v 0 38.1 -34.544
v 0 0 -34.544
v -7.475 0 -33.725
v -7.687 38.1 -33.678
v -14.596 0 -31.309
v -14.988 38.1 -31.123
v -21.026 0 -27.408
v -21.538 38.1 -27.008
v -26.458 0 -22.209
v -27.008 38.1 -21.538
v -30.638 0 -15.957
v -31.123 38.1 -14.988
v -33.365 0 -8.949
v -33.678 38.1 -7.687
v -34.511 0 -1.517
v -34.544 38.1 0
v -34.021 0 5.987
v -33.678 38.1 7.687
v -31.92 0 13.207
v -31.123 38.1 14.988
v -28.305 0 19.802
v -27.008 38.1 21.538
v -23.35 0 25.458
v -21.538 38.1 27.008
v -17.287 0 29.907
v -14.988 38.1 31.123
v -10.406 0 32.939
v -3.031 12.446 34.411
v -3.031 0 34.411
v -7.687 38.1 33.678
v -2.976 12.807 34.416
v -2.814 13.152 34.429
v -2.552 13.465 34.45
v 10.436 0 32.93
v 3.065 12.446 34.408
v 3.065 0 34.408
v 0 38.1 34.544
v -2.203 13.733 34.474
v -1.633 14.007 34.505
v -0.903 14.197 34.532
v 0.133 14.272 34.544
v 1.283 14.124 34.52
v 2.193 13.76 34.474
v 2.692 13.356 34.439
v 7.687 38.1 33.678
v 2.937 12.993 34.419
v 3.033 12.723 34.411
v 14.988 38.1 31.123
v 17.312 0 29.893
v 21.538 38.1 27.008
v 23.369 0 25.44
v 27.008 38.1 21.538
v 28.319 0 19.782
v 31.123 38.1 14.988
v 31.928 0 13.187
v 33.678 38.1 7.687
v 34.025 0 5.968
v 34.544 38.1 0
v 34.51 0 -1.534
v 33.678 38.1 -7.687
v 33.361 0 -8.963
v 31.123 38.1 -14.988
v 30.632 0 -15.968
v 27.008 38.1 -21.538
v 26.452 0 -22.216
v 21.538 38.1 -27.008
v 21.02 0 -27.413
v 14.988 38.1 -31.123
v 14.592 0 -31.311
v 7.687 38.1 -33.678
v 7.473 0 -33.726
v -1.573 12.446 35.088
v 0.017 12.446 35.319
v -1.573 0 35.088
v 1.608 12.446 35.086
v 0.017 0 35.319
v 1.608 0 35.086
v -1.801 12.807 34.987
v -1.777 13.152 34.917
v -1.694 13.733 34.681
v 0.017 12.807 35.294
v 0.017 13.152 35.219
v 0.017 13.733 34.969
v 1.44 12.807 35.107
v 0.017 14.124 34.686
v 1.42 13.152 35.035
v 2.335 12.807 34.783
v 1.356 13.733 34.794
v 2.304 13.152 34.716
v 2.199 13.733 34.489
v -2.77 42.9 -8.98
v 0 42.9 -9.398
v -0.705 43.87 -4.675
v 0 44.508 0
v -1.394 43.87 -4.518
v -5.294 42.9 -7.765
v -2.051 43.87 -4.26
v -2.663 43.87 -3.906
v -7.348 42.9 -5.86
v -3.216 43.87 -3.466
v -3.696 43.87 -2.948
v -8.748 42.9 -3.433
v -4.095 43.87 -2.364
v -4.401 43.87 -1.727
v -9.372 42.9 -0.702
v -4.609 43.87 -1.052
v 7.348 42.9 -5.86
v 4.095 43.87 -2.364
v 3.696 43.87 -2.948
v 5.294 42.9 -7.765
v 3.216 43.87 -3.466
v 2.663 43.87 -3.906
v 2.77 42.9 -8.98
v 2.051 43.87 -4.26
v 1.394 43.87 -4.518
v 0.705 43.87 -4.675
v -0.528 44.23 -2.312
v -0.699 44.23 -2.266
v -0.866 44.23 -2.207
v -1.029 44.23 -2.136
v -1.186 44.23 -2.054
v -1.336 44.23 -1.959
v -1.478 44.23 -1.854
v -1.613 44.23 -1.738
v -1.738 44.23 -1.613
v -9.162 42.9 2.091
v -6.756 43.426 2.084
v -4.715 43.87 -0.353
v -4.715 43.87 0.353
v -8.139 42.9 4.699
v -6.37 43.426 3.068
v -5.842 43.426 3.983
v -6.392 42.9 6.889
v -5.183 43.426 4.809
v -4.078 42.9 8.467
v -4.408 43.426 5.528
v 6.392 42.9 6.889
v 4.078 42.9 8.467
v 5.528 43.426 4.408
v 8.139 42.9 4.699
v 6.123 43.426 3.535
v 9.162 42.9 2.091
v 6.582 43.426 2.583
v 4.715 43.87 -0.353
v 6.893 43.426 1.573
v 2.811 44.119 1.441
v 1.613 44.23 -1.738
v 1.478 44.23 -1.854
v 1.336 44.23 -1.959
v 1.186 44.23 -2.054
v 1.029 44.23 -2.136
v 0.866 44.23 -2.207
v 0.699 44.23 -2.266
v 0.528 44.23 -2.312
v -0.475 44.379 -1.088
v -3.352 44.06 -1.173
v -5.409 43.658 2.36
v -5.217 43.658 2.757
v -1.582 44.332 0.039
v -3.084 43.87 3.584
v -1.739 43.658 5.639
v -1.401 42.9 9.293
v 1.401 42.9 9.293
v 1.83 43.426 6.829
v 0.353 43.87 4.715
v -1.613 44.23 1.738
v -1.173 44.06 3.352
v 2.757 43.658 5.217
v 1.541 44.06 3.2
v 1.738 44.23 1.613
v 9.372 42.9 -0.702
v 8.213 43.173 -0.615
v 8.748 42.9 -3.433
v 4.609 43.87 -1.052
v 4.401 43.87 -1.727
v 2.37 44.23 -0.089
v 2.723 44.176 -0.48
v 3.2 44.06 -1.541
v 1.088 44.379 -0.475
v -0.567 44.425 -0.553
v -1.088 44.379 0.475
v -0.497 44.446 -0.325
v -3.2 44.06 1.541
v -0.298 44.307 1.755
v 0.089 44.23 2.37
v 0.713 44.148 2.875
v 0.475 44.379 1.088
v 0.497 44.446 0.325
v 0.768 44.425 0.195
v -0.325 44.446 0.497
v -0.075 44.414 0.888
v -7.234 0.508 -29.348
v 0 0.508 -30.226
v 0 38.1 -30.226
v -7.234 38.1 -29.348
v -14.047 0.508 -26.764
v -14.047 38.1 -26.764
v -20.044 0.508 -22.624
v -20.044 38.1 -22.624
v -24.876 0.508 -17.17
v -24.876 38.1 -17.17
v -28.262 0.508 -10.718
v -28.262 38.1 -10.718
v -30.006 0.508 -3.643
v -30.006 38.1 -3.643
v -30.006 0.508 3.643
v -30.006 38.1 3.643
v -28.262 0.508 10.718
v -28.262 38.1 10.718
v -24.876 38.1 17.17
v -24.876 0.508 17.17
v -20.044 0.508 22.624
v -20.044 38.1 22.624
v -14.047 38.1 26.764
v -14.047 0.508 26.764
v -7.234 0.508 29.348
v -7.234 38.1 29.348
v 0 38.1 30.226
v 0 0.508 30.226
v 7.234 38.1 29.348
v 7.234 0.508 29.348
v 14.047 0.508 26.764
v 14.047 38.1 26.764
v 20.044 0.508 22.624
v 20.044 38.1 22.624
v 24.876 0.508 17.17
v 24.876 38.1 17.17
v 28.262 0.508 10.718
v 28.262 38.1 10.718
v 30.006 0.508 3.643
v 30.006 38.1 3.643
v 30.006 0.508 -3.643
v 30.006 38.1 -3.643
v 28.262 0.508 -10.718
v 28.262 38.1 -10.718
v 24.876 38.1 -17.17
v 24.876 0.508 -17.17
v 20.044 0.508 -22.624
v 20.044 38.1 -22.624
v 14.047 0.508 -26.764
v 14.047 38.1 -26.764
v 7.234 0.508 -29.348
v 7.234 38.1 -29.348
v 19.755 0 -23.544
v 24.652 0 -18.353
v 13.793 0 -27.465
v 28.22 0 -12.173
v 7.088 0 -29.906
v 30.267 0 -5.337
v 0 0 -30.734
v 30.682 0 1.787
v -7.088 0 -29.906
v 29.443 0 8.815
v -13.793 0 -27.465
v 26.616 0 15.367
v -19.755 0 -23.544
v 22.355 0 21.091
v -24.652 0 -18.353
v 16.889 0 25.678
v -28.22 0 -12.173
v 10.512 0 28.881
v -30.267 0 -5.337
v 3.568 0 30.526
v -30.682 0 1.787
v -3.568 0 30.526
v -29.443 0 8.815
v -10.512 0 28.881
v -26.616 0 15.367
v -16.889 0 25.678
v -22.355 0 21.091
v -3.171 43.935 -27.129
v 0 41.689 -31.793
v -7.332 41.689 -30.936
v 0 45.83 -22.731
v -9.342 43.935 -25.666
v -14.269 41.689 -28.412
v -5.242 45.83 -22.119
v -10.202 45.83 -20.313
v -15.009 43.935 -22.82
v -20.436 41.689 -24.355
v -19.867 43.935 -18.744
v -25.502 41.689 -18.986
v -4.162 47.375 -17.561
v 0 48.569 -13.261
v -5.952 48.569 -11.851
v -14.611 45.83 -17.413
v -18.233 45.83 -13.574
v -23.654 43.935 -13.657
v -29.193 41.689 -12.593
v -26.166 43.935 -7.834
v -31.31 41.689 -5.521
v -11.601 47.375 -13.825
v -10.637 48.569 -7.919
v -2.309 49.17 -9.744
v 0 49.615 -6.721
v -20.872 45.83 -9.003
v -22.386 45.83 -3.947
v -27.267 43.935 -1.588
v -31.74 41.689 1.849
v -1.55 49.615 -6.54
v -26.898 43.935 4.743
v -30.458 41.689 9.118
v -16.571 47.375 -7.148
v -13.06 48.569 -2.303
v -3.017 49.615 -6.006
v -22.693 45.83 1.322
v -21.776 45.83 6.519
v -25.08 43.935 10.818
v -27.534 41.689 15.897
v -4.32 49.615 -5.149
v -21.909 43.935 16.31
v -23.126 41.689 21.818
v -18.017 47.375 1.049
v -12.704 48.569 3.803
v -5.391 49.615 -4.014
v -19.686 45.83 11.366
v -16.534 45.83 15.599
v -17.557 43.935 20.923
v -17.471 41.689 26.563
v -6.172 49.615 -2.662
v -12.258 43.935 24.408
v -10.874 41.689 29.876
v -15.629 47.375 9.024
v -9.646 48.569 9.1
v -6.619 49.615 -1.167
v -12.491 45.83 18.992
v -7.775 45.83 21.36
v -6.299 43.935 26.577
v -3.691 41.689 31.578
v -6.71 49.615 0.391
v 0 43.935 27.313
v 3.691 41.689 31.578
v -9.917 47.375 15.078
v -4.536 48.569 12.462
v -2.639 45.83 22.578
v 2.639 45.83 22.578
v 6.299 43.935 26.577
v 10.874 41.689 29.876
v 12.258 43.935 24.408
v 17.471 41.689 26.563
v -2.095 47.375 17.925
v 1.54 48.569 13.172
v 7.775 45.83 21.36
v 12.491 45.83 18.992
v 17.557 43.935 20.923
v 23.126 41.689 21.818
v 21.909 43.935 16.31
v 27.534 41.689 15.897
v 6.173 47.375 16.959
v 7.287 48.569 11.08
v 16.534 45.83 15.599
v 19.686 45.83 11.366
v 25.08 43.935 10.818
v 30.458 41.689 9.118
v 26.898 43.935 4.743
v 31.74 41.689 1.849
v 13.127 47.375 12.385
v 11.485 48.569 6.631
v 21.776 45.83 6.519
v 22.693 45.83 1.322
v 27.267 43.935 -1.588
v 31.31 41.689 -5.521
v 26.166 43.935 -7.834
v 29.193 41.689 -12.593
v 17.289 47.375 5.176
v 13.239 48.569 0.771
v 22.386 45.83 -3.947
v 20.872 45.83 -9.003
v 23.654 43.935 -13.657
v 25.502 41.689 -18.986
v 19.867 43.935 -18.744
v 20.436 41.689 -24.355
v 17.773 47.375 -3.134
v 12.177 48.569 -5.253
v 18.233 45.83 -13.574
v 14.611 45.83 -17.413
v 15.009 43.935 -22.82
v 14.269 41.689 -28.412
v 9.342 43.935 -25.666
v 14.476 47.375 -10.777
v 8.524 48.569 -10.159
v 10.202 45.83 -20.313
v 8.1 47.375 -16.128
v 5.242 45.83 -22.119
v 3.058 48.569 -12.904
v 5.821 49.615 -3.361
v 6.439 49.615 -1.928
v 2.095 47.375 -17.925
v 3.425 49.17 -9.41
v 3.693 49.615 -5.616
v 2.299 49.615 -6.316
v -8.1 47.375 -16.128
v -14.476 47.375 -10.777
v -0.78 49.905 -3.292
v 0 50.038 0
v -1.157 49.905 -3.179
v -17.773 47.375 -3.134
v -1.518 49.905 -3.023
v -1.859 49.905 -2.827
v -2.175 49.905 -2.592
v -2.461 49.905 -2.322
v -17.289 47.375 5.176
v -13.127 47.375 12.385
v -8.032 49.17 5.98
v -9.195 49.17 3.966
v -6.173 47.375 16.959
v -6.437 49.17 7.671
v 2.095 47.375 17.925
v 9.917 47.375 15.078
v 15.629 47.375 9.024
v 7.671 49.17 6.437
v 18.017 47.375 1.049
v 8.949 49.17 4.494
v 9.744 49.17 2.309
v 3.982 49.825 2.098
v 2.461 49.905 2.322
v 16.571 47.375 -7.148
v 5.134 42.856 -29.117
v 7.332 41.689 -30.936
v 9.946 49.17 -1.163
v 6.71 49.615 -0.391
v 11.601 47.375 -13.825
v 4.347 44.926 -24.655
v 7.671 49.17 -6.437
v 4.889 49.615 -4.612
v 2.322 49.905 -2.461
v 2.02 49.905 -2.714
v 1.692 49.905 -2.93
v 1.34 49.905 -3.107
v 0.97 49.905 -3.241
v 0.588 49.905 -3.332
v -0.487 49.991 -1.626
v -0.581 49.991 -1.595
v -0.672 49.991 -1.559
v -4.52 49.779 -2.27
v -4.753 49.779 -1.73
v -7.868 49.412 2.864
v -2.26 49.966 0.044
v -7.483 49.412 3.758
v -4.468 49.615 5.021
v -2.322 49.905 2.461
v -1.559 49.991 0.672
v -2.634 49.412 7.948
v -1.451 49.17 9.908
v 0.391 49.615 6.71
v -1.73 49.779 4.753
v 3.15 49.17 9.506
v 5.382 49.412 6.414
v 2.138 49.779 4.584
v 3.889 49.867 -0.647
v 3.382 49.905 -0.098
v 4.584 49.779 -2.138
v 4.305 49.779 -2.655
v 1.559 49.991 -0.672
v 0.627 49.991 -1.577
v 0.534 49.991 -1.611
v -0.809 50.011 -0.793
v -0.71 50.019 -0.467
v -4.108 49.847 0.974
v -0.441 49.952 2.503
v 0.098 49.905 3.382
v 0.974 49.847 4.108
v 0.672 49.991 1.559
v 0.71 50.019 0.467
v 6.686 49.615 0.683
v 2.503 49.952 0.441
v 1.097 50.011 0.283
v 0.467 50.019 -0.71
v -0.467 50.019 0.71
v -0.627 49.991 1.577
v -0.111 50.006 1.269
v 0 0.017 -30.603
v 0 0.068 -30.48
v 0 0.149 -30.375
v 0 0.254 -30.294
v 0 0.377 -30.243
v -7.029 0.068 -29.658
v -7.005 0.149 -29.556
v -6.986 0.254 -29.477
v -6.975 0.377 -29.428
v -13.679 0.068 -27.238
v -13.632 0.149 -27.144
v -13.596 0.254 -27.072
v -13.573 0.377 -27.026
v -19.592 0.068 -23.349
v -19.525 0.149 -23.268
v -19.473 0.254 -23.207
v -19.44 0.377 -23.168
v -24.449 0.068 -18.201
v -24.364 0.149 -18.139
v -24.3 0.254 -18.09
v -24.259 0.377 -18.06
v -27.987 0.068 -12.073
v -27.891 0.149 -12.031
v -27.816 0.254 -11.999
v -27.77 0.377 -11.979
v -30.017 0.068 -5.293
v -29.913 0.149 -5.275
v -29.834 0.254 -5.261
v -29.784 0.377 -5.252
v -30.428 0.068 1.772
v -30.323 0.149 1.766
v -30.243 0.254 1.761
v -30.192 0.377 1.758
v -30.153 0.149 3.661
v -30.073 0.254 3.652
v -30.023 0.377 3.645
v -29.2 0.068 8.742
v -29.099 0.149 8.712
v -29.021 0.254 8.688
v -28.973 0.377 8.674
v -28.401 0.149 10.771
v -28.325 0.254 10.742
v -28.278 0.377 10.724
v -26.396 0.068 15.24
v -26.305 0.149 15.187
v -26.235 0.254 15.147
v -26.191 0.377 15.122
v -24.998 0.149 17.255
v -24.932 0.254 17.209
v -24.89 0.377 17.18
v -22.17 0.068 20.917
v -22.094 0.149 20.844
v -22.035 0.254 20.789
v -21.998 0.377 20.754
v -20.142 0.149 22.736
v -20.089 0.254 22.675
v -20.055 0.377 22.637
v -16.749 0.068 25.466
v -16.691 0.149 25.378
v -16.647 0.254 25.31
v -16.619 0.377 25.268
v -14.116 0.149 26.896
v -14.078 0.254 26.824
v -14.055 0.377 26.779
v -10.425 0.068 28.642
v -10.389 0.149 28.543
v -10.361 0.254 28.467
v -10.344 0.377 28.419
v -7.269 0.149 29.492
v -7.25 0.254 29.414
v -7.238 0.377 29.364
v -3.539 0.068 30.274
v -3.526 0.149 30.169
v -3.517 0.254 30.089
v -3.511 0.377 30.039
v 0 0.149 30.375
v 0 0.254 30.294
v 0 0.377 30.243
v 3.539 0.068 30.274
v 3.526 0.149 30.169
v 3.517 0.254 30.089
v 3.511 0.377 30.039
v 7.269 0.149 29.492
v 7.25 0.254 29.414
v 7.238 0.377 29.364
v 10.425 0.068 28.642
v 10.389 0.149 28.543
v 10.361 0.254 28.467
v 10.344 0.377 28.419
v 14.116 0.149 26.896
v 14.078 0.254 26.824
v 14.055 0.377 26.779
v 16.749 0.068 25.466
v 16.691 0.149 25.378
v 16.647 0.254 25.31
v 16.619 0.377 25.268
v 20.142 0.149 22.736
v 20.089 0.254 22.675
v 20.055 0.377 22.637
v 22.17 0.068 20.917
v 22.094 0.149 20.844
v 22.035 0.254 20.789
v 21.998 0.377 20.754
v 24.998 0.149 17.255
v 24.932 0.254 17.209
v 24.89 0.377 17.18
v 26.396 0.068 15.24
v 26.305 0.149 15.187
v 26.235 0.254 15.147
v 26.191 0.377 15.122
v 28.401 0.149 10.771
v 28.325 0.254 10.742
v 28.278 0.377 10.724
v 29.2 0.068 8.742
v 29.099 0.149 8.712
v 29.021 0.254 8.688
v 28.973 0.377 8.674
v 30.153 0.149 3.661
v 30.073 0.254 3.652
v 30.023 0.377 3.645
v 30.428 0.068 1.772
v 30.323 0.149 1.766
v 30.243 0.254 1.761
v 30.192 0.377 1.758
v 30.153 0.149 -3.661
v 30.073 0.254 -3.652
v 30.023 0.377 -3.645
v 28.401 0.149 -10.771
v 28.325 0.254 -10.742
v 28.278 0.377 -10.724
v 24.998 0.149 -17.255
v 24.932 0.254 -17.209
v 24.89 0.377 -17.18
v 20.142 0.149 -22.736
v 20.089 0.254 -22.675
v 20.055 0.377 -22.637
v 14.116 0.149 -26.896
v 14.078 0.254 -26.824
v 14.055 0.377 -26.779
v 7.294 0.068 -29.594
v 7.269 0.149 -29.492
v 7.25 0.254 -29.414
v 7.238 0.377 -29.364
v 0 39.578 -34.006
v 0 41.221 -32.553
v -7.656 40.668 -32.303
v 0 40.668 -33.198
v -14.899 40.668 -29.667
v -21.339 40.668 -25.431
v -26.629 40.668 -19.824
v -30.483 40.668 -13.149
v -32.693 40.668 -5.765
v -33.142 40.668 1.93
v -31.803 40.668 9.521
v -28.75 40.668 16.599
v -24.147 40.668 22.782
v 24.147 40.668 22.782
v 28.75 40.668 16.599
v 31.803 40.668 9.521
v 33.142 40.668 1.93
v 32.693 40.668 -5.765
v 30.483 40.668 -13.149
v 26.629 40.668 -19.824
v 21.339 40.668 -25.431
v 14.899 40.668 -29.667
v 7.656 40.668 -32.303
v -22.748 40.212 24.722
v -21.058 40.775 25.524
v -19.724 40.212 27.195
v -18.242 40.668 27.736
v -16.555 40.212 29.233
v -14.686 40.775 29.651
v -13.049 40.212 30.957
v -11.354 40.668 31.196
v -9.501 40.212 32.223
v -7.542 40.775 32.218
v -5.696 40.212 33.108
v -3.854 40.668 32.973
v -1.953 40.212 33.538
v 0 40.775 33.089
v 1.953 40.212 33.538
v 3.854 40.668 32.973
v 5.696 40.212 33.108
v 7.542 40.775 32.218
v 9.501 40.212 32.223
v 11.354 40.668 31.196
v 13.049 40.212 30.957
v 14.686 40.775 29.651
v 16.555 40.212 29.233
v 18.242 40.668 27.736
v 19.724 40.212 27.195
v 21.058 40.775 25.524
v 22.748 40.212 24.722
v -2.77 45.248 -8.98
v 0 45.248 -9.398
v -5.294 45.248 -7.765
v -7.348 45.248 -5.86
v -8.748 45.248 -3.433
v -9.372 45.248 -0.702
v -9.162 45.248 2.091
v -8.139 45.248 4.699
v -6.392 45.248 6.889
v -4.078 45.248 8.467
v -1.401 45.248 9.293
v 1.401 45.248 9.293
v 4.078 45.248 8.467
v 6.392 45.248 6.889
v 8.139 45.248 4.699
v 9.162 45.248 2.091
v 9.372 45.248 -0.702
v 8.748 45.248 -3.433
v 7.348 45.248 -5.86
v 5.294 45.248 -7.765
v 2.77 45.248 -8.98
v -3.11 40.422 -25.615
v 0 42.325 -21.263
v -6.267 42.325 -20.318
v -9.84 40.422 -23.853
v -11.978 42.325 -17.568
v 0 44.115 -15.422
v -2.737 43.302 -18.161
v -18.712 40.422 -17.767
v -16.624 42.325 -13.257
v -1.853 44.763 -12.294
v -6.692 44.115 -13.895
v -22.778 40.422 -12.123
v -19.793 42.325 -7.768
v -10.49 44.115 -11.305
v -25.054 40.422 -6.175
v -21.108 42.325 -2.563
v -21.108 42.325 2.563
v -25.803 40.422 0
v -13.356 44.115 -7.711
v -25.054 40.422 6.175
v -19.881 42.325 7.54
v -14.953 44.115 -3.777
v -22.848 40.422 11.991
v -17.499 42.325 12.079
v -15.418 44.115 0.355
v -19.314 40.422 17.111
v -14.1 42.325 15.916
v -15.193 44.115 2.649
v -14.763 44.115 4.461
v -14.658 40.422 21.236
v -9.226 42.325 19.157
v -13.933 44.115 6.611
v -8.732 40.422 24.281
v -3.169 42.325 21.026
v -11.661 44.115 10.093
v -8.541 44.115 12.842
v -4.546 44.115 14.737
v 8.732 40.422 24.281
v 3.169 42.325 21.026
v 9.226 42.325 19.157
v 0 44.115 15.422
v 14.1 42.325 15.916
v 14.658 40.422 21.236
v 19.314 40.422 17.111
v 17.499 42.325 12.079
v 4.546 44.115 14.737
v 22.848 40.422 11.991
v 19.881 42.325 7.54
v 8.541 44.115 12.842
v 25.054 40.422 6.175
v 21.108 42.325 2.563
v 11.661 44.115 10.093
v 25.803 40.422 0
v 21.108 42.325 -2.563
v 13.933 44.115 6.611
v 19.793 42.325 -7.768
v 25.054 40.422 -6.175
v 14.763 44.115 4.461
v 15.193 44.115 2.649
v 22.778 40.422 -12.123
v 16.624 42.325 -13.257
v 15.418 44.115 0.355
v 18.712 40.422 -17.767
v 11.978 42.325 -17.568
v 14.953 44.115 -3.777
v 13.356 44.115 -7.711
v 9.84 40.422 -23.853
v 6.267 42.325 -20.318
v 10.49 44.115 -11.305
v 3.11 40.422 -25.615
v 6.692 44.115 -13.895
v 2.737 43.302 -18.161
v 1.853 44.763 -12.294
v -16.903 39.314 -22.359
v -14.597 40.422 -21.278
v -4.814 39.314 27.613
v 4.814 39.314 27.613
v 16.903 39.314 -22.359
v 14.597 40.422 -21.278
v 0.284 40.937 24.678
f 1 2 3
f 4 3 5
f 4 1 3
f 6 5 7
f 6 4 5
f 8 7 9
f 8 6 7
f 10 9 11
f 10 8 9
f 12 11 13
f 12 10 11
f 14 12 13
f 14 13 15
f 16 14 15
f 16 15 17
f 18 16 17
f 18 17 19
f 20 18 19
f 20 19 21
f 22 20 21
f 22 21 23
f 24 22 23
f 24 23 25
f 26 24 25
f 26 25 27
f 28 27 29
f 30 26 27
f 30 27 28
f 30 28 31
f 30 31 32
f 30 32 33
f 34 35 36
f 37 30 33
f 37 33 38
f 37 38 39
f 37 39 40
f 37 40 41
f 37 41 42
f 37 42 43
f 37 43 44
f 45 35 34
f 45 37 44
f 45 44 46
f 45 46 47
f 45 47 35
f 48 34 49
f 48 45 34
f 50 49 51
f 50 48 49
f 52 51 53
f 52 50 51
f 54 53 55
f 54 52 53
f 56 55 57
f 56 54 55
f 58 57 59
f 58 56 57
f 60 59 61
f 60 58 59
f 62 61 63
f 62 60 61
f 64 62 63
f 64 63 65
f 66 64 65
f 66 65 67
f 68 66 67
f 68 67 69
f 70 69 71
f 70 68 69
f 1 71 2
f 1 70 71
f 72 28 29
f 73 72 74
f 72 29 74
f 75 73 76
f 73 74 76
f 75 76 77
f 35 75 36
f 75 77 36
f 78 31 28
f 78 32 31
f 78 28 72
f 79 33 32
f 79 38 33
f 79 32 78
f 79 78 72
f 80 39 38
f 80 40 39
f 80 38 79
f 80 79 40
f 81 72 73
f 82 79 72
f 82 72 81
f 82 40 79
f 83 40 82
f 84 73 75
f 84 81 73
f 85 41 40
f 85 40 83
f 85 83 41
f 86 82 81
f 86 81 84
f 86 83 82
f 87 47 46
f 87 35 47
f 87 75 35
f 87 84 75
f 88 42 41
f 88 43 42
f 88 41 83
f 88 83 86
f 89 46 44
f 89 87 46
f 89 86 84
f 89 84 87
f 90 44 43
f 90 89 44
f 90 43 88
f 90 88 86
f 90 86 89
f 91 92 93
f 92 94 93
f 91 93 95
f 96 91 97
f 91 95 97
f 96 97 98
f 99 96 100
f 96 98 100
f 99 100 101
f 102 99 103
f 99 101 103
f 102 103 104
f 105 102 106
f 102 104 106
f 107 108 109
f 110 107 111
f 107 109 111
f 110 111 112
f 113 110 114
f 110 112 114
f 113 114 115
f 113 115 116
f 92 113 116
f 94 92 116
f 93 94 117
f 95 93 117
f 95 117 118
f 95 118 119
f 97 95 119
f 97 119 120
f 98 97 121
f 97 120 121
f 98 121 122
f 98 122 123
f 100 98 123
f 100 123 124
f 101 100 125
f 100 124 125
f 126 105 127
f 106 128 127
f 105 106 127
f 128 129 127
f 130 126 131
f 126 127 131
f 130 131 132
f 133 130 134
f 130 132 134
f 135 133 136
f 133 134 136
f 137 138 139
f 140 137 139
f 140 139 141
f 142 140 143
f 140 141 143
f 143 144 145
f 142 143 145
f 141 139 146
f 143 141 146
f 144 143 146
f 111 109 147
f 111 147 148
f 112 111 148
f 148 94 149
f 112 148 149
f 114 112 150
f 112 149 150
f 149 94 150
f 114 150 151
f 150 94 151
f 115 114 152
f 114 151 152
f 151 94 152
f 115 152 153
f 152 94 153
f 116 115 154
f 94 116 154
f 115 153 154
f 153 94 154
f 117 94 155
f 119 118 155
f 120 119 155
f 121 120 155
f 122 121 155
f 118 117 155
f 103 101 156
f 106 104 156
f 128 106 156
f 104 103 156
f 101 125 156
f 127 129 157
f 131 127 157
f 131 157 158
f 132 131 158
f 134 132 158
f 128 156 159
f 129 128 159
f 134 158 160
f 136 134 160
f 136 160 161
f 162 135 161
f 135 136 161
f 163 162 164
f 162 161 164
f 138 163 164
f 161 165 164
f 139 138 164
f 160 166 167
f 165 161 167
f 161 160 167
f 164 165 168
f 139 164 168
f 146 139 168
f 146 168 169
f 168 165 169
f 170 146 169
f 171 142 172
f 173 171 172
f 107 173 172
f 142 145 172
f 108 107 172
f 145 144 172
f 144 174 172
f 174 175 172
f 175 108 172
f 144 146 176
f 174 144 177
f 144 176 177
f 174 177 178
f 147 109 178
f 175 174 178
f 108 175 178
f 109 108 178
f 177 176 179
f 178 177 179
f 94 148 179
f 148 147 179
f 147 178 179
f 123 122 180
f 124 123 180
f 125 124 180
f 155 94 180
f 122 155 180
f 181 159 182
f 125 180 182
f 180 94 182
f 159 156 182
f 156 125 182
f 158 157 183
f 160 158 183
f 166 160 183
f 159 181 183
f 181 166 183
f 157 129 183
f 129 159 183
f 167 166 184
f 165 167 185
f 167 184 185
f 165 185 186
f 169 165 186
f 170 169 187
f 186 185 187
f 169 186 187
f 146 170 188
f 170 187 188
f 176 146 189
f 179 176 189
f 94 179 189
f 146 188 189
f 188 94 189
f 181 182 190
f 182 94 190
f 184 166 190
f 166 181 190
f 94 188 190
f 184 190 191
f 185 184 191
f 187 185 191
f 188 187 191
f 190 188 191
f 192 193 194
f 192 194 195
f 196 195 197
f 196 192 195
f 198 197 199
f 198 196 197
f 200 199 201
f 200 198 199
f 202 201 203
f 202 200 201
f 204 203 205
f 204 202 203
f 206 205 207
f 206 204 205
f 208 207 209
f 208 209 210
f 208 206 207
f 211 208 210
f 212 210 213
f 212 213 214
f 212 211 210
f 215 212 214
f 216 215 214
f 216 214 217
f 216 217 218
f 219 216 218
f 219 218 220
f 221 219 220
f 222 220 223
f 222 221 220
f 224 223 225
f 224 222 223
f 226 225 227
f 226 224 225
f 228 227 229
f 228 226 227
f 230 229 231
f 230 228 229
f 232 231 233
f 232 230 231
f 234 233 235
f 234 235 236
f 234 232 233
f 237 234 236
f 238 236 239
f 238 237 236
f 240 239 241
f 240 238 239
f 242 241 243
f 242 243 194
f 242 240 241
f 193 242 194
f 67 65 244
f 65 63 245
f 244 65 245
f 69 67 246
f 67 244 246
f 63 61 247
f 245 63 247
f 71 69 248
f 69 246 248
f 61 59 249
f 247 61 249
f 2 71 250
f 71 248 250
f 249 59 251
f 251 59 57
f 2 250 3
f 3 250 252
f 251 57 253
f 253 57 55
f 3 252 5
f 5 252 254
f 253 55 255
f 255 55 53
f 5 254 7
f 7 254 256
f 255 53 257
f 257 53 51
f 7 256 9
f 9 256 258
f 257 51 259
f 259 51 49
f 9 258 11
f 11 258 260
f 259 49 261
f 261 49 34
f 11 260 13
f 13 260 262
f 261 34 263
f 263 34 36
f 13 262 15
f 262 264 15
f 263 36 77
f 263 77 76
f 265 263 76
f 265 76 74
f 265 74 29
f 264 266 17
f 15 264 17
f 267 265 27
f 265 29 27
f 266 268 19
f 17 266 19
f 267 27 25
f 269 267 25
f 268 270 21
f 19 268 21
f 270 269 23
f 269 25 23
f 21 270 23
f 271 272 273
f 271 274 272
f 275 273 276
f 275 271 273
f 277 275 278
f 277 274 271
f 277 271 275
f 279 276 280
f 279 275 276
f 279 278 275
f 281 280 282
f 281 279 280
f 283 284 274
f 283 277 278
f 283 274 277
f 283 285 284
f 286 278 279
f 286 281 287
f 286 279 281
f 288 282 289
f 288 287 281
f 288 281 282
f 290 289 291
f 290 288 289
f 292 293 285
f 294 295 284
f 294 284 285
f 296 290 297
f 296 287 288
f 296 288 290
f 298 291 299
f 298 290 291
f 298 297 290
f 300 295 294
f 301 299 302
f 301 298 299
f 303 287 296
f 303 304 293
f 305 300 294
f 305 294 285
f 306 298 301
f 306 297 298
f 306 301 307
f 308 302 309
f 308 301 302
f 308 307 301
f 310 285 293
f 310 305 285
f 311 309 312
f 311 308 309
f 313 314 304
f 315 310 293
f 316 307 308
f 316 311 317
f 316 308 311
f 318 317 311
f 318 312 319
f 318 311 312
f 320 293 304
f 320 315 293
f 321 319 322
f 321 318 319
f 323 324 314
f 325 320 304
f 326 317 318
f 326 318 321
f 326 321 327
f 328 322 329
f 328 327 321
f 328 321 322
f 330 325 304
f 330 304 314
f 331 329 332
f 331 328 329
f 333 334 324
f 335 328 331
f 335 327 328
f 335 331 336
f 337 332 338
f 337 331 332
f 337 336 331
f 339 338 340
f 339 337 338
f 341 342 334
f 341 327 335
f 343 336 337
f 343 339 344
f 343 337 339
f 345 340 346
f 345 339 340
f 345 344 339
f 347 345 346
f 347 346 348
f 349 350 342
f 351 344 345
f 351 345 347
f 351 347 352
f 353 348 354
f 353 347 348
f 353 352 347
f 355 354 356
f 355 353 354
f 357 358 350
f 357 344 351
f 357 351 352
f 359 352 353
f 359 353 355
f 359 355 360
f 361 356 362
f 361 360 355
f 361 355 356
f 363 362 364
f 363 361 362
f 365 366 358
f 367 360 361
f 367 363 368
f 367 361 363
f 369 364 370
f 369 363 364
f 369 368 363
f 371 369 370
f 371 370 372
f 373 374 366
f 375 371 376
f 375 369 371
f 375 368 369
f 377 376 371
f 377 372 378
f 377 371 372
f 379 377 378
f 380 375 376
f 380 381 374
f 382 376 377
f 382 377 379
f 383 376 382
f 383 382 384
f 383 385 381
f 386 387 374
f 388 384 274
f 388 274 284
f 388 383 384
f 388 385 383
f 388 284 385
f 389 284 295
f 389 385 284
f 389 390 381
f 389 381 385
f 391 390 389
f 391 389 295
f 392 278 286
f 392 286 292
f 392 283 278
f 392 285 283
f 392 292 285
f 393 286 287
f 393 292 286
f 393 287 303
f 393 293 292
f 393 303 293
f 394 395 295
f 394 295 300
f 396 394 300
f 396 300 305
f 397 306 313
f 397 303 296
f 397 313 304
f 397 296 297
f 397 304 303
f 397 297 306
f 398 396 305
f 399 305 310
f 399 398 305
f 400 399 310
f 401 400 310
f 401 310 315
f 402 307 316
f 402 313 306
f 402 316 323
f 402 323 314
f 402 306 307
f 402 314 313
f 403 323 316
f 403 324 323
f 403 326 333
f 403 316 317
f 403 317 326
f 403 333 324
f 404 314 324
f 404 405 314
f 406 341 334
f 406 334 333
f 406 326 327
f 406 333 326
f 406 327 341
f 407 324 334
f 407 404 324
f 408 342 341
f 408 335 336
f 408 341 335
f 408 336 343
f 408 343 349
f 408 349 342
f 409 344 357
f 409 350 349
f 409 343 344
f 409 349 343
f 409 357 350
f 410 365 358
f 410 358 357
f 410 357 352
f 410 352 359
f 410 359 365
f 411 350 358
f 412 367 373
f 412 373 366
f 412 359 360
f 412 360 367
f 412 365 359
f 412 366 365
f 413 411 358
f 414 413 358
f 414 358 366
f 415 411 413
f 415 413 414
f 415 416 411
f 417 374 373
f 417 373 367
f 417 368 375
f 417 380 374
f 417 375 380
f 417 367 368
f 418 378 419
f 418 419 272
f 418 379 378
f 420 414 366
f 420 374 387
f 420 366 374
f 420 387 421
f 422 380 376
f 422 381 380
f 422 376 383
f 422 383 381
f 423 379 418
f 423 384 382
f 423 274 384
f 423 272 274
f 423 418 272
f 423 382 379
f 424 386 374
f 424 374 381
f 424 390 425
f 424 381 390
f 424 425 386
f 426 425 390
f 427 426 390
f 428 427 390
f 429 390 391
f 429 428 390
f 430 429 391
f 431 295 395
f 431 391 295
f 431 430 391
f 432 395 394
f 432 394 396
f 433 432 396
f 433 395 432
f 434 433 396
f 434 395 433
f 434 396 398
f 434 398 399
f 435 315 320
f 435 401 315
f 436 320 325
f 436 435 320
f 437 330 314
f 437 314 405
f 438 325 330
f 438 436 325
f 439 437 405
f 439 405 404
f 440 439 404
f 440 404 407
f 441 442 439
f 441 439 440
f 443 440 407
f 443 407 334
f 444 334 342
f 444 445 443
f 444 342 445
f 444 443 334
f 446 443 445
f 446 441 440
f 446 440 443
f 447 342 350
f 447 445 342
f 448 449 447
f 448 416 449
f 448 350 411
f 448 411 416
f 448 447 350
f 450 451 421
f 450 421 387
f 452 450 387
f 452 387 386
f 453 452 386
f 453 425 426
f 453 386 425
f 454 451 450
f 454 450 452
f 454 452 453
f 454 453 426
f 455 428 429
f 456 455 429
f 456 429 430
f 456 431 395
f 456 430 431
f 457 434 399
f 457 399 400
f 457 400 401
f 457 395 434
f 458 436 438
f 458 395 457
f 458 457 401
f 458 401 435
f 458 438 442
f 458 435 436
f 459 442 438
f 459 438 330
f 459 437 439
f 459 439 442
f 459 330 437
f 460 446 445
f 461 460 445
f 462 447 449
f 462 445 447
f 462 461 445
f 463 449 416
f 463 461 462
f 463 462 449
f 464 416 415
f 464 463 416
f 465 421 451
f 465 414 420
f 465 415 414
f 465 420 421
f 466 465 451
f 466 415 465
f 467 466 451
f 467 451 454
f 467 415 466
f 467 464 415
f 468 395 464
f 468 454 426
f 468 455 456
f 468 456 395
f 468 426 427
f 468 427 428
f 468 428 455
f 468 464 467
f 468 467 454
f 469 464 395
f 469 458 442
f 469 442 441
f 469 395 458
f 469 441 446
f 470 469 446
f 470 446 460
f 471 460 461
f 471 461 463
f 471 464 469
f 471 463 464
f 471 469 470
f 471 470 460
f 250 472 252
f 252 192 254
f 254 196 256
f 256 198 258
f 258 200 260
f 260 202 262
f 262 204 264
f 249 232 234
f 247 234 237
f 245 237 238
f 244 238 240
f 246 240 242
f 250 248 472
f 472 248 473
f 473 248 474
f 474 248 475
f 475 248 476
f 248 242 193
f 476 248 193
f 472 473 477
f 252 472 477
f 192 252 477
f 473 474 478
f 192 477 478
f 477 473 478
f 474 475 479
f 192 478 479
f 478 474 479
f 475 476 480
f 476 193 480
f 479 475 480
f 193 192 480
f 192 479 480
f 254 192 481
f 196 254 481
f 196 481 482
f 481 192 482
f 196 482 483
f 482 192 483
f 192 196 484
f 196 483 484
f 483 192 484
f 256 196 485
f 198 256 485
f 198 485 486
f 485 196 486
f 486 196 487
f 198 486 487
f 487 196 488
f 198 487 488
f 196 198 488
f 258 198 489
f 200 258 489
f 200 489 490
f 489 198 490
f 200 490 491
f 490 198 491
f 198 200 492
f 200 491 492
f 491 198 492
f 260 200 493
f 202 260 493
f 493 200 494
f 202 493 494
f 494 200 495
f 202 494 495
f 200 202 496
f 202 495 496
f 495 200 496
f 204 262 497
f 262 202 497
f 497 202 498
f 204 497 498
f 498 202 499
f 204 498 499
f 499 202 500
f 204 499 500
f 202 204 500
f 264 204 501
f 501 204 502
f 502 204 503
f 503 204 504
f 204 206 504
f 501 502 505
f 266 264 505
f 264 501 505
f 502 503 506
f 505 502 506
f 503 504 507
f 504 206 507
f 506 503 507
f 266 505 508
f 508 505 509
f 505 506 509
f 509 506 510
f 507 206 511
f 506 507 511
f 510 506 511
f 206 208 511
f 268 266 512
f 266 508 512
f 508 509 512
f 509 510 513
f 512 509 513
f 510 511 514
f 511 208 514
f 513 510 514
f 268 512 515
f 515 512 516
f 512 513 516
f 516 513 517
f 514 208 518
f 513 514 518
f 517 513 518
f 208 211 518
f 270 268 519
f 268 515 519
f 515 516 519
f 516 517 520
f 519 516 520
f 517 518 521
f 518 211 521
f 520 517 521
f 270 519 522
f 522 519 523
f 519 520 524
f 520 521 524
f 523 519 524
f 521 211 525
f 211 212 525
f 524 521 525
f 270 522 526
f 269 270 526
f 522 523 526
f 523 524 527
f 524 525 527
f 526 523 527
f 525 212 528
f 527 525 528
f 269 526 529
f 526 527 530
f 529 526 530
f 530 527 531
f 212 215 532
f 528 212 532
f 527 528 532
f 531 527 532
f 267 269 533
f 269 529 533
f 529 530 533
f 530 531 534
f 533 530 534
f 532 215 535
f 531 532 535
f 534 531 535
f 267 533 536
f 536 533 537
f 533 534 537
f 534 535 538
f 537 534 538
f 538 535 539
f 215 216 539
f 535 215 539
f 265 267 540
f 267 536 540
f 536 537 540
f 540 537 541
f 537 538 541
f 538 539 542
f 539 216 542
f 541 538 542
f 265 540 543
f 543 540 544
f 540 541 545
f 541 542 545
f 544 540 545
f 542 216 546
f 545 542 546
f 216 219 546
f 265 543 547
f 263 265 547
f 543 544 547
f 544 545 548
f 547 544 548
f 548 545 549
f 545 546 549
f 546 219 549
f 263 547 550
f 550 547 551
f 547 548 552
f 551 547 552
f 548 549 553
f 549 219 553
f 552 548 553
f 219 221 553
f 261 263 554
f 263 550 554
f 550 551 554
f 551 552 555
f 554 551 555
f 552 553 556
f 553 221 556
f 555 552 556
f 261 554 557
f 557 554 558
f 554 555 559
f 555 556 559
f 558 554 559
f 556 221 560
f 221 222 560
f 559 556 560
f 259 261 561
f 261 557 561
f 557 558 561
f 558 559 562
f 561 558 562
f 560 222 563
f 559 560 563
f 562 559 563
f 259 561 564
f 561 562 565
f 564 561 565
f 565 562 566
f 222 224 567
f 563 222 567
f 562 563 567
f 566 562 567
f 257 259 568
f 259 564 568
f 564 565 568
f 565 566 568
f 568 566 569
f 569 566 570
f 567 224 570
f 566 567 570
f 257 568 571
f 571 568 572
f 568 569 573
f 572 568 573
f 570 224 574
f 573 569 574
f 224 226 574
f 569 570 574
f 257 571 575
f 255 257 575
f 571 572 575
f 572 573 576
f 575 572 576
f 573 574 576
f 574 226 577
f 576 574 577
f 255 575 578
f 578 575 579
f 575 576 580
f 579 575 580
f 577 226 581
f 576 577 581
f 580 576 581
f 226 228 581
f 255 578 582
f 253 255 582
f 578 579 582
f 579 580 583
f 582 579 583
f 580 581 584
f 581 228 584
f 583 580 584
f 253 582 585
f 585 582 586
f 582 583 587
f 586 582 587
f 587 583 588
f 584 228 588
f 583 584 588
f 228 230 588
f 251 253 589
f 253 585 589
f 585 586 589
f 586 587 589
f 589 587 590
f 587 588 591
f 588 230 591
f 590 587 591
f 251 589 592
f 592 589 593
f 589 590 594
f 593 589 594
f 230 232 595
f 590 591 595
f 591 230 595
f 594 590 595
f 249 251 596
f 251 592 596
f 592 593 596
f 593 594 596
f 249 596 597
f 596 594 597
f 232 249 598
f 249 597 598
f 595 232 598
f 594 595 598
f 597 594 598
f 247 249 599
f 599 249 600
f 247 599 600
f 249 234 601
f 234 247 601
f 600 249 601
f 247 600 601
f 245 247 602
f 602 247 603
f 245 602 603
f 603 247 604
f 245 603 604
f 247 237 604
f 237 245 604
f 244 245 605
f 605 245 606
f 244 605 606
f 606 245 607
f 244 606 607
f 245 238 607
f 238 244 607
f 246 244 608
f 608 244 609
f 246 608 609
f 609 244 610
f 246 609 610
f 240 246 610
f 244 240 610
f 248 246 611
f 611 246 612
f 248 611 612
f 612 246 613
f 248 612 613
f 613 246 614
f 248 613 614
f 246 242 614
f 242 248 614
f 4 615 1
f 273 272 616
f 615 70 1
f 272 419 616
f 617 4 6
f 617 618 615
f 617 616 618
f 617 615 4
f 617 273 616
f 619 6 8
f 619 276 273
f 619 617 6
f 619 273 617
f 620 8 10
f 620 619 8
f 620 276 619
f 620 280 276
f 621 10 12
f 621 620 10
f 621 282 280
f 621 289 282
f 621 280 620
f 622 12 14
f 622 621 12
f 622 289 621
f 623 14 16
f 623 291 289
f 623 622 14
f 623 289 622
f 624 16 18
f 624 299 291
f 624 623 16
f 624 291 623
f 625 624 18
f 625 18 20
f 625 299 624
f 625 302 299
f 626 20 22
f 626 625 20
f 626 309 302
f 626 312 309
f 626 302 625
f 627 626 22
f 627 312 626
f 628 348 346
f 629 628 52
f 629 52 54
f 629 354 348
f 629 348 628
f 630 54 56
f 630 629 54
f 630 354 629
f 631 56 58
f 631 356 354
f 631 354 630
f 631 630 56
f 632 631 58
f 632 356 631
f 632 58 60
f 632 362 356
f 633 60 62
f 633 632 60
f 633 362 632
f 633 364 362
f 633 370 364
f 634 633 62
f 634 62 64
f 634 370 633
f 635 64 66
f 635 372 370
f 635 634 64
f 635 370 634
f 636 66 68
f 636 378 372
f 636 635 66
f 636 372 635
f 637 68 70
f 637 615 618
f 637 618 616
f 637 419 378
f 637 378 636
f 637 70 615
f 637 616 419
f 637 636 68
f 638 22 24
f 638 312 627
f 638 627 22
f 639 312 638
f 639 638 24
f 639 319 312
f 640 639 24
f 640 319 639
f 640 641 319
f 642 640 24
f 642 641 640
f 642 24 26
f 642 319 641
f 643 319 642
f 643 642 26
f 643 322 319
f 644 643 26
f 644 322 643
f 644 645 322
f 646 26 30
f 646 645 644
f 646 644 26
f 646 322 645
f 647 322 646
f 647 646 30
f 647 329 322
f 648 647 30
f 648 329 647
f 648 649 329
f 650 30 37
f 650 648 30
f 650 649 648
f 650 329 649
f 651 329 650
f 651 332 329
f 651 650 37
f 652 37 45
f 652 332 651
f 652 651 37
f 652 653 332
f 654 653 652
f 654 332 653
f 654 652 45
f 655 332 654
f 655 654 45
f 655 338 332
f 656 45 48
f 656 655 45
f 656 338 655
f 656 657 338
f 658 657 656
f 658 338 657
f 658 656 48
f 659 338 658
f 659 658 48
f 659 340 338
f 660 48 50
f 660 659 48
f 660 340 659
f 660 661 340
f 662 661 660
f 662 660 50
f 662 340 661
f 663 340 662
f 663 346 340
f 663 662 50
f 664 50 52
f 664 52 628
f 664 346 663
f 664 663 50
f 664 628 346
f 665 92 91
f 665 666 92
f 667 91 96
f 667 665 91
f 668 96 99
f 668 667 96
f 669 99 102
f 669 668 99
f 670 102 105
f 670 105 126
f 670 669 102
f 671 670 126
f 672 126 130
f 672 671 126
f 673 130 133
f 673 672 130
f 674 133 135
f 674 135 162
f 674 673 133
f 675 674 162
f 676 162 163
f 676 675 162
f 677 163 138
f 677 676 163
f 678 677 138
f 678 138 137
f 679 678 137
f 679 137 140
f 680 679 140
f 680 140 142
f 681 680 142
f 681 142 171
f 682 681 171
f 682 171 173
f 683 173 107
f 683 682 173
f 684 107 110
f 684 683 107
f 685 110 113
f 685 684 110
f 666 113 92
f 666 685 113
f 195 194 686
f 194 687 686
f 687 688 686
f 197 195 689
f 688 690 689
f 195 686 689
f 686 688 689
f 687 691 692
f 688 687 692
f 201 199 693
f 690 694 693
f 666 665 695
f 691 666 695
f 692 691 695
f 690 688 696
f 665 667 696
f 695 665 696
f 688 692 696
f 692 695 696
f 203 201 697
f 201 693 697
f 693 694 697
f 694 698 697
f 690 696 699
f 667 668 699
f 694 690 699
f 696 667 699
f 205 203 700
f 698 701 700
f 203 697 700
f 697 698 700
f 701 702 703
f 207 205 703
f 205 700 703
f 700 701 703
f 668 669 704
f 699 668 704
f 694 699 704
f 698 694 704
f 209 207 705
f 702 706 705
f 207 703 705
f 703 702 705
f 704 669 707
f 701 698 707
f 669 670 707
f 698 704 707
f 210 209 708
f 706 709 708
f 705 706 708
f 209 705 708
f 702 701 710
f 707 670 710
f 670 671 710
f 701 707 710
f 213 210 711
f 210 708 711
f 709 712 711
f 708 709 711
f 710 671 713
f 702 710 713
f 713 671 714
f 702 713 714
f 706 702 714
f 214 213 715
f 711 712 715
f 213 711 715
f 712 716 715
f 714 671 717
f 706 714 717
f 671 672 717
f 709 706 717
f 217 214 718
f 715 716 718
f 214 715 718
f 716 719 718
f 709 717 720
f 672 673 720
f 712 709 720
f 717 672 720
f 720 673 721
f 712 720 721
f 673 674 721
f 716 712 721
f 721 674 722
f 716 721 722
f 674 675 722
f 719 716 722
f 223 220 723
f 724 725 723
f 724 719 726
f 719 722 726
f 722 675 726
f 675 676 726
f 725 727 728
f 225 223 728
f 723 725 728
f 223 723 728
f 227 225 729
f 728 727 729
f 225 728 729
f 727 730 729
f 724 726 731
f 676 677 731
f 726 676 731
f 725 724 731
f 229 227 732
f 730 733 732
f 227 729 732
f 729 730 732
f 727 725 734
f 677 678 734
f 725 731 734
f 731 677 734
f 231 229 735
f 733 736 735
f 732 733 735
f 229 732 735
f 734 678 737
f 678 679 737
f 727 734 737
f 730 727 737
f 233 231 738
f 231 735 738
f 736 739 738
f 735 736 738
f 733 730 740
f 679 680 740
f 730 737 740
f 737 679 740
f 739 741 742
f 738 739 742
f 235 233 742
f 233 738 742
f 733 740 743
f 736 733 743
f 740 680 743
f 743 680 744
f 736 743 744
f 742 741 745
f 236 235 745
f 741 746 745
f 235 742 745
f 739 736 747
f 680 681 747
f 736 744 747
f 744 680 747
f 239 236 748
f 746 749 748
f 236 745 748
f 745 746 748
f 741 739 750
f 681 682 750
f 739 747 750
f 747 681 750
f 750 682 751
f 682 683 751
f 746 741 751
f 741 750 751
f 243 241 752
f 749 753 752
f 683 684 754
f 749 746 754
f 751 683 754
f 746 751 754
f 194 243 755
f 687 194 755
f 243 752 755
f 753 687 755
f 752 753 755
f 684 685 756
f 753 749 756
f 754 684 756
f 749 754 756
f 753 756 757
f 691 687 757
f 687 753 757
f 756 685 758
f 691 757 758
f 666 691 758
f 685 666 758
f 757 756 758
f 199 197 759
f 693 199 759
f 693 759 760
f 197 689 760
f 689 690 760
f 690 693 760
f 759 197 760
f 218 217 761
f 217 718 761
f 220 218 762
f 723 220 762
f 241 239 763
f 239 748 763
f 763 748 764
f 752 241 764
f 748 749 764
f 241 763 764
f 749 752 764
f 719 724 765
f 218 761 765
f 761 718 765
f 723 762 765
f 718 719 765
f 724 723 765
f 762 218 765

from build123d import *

# Parameters (mm, degrees)
BOSS_EXTRUDE1_DEPTH = 14.986
FILLET1_R           = 2.54
FILLET2_R           = 0.508


with BuildPart() as part:
    # Sketch1 → Revolve1 (revolve)
    with BuildSketch(Plane(origin=(0, 0, 0), x_dir=(0, 0, -1), z_dir=(1, 0, 0)), mode=Mode.PRIVATE) as revolve1_sk:
        with BuildLine():
            Line((-30.226, 0), (-34.544, 0))
            Line((-34.544, 0), (-34.544, 38.1))
            add(Edge.make_bspline(
                [(-34.544, 38.1), (-34.021080338, 40.529206207), (-31.793319074, 41.68897665)],
                knots=[0, 0, 0, 1, 1, 1], degree=2))
            add(Edge.make_bspline(
                [(-31.793319074, 41.68897665), (-17.029892538, 49.760170098), (0, 50.038)],
                knots=[0, 0, 0, 1, 1, 1], degree=2))
            Line((0, 50.038), (0, 44.508100575))
            add(Edge.make_bspline(
                [(-9.398, 42.89990788), (-4.757001601, 44.03505485), (0, 44.508100575)],
                knots=[0, 0, 0, 1, 1, 1], degree=2))
            Line((-9.398, 42.89990788), (-9.398, 45.248349281))
            add(Edge.make_bspline(
                [(-30.226, 38.1), (-23.680294376, 41.89814151), (-16.73762771, 44.280924604), (-9.398, 45.248349281)],
                knots=[0, 0, 0, 0, 0.705520621, 0.705520621, 0.705520621, 0.705520621], degree=3))
            Line((-30.226, 38.1), (-30.226, 0))
        make_face()
    revolve(revolve1_sk.sketch.rotate(Axis((0, 0, 0), (0, 1, 0)), 180), axis=Axis((0, 0, 0), (0, 1, 0)))

    # Sketch2 → Boss-Extrude1 (add)
    with BuildSketch(Plane.XZ):
        with BuildLine():
            ThreePointArc((-3.031237567, 34.410747374), (0.017205772, 35.31933097), (3.064762433, 34.407777714))
            add(Edge.make_bspline(
                [(-3.031237567, 34.410747374), (0.016426392, 33.804246246), (3.064762433, 34.407777714)],
                knots=[0, 0, 0, 1, 1, 1], degree=2))
        make_face()
    extrude(amount=-BOSS_EXTRUDE1_DEPTH)

    # Fillet1
    # the kernel refuses this fillet: 2.54 mm, written as the material it takes off along each edge
    with BuildSketch(Plane(origin=(0.014497608, 14.986, 29.760117923), x_dir=(-0.9885428097510283, 0, -0.15094076086181066), z_dir=(0.15094076086181066, 0, -0.9885428097510283))) as fillet1_piece_1_section:
        with BuildLine():
            CenterArc((5.559213707 - FILLET1_R, -FILLET1_R), FILLET1_R, 0, 90)
            Line((5.559213707 - FILLET1_R, 0), (5.559213707 - FILLET1_R, FILLET1_R * 0.02))
            Line((5.559213707 - FILLET1_R, FILLET1_R * 0.02), (5.559213707 + FILLET1_R * 0.02, FILLET1_R * 0.02))
            Line((5.559213707 + FILLET1_R * 0.02, FILLET1_R * 0.02), (5.559213707 + FILLET1_R * 0.02, -FILLET1_R))
            Line((5.559213707 + FILLET1_R * 0.02, -FILLET1_R), (5.559213707, -FILLET1_R))
        make_face()
    fillet1_piece_1 = revolve(axis=Axis((0.014497608, 14.986, 29.760117923), (0, 1, 0)), revolution_arc=197.418721047, mode=Mode.PRIVATE)
    fillet1_piece_1 = fillet1_piece_1 - Plane(origin=(0, 14.161727142, 0), x_dir=(0, 0, -1), z_dir=(0, 1, 0)) * Cylinder(34.544, 23, mode=Mode.PRIVATE)
    add(fillet1_piece_1, mode=Mode.SUBTRACT)

    # Fillet2
    fillet2_edges = [part.edges().sort_by_distance(p)[0] for p in [
        (0, 0, 30.226),
    ]]
    fillet(fillet2_edges, radius=FILLET2_R)


solid = part.part
